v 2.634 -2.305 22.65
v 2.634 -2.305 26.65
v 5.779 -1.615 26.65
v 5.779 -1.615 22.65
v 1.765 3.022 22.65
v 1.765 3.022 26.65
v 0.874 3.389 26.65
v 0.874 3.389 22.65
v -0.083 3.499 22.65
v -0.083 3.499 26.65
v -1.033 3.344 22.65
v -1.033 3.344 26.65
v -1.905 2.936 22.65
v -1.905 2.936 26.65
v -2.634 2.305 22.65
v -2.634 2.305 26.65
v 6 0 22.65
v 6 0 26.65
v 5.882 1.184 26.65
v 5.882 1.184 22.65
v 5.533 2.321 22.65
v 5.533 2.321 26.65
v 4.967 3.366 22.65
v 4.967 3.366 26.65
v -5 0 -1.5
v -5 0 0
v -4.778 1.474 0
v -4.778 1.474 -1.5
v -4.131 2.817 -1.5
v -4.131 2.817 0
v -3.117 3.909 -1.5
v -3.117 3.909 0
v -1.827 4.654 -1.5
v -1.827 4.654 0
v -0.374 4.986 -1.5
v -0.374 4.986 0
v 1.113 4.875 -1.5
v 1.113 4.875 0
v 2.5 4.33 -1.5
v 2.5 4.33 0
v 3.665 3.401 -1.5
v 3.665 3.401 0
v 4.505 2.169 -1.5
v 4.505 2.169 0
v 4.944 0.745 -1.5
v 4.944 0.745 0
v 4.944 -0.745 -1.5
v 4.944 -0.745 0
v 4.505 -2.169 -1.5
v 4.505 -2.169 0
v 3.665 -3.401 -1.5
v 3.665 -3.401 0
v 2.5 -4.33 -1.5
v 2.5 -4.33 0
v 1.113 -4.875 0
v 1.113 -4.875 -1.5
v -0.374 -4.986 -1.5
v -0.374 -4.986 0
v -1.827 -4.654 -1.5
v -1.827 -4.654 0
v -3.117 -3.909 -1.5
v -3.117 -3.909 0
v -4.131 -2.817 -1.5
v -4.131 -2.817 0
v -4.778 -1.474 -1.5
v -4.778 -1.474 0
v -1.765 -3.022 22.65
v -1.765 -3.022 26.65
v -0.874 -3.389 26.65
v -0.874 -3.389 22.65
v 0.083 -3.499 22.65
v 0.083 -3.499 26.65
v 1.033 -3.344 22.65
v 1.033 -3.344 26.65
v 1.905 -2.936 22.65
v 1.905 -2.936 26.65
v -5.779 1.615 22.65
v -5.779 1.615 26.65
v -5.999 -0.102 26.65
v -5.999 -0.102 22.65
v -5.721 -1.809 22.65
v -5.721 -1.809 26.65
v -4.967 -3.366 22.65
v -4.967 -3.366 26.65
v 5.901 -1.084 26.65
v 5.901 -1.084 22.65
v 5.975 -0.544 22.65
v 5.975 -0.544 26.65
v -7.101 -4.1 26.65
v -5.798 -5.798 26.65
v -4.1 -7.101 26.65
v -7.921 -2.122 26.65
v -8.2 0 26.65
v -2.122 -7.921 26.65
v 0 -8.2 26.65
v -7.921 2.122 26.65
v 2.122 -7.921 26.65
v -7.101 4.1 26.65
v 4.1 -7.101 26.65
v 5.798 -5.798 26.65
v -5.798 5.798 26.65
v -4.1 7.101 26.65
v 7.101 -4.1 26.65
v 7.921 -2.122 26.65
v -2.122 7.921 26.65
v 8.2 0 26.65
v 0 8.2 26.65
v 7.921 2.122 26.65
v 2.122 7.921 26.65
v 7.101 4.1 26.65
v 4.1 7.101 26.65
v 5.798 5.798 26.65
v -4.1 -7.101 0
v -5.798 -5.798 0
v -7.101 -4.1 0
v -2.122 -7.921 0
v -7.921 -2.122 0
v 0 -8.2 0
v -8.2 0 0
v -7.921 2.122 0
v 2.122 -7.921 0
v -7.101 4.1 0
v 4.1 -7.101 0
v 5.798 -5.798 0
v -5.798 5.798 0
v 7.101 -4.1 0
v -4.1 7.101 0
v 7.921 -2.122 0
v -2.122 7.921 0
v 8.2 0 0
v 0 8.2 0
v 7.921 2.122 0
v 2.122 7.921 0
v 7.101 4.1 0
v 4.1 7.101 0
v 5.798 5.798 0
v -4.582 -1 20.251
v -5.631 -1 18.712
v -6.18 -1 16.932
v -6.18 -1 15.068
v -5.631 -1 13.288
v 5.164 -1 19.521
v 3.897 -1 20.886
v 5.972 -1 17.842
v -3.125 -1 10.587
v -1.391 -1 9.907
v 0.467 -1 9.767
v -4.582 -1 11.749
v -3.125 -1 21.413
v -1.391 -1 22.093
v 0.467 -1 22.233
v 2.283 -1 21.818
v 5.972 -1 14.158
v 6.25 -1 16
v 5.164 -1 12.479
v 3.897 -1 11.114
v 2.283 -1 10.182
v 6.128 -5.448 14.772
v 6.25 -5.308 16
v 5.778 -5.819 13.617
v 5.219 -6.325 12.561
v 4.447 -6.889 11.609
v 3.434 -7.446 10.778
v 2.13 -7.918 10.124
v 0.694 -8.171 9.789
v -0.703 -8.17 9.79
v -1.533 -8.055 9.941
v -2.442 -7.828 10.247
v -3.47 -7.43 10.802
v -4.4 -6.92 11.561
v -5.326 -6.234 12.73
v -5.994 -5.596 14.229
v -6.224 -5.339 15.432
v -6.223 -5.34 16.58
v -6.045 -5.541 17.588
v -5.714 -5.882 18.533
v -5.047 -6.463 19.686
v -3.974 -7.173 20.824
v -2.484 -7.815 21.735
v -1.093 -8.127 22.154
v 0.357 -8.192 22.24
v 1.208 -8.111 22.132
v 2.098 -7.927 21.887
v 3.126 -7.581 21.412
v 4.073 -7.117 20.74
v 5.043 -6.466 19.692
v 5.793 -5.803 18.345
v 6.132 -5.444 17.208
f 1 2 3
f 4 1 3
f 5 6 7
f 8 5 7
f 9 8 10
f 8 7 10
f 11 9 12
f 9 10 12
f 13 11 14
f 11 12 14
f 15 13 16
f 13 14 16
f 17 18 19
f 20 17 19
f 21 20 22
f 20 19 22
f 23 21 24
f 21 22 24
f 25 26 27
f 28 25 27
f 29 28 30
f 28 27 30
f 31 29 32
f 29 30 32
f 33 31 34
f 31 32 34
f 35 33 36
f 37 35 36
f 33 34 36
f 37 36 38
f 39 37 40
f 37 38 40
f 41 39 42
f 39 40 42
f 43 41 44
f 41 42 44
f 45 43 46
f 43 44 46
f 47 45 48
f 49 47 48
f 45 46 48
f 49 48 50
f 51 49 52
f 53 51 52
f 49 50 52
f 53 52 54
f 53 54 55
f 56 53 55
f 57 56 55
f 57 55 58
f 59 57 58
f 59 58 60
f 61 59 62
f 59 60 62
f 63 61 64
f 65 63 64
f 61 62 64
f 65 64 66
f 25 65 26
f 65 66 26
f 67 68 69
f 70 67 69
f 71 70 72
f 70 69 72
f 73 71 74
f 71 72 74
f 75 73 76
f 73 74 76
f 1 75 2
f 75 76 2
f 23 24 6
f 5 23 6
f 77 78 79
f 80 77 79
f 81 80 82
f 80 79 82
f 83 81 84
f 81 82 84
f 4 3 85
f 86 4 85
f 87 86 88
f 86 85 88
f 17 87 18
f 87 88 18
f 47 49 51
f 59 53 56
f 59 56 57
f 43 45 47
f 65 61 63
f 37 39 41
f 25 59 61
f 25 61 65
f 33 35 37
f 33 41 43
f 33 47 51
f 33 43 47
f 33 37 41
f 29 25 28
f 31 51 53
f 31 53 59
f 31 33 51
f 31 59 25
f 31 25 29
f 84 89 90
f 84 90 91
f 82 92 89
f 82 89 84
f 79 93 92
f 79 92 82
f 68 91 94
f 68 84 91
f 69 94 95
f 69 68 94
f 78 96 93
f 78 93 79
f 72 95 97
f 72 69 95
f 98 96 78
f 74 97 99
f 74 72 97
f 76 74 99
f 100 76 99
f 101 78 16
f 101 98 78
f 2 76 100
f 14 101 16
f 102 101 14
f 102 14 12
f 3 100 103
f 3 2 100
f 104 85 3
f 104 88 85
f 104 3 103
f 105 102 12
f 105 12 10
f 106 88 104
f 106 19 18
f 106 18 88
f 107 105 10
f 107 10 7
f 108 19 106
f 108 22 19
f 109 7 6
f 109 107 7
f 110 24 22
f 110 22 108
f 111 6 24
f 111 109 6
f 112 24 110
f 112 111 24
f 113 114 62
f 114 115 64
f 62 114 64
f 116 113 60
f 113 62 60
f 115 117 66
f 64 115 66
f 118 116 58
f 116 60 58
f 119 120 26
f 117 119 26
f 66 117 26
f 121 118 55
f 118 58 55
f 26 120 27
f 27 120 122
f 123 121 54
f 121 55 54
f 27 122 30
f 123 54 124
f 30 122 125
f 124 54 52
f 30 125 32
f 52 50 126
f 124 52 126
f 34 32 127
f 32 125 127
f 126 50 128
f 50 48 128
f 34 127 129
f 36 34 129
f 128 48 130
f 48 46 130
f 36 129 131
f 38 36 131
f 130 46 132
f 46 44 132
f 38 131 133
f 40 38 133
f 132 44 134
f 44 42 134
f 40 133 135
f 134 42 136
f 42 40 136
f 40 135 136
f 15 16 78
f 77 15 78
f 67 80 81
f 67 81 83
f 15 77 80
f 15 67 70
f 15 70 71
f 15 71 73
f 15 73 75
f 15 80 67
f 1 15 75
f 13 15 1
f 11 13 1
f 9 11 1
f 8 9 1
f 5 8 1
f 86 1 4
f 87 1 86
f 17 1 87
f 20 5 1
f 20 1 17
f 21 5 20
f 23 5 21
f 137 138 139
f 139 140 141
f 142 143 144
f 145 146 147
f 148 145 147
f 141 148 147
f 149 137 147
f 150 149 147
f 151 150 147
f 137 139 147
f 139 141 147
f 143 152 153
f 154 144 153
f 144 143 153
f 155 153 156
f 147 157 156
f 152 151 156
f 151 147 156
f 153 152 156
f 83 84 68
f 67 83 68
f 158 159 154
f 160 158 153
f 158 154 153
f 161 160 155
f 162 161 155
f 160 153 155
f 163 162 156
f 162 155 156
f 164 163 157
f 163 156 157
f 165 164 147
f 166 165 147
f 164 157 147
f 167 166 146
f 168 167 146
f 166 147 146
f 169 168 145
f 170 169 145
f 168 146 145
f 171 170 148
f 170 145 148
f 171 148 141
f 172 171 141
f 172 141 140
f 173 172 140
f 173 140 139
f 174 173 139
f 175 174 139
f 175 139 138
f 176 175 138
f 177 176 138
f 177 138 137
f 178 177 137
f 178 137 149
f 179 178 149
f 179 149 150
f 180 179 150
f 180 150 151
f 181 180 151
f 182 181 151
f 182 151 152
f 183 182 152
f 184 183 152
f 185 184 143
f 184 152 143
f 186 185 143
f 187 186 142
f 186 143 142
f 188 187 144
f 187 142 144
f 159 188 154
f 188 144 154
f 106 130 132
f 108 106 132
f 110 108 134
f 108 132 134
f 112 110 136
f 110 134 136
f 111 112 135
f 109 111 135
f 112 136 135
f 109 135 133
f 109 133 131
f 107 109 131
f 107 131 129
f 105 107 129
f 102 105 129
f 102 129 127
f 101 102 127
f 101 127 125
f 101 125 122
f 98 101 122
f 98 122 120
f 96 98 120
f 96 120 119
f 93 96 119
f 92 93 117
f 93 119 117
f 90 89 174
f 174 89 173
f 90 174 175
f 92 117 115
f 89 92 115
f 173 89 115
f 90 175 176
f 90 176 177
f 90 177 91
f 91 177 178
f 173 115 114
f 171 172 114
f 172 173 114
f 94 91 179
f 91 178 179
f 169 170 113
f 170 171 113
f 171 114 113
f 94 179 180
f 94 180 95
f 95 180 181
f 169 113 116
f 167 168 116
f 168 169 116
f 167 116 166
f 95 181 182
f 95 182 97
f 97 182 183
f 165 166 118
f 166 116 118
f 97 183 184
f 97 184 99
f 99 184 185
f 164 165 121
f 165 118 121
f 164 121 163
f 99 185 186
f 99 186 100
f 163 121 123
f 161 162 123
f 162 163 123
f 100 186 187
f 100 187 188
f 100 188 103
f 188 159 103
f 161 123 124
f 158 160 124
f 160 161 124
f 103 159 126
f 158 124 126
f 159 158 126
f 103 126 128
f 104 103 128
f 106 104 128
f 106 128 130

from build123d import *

# Parameters (mm, degrees)
SKETCH_1_R          = 8.2
EXTRUDE_1_DEPTH     = 26.65
SKETCH_3_R          = 5
EXTRUDE_2_DEPTH     = 1.5
CUT_EXTRUDE_1_DEPTH = 4
CUT_EXTRUDE_START   = -1
SKETCH_5_R          = 6.25
CUT_EXTRUDE_2_DEPTH = 10


with BuildPart() as part:
    # Эскиз1 → Бобышка-Вытянуть1 (new body)
    with BuildSketch(Plane.XY):
        Circle(SKETCH_1_R)
    extrude(amount=EXTRUDE_1_DEPTH)

    # Эскиз3 → Бобышка-Вытянуть2 (add)
    with BuildSketch(Plane(origin=(0, 0, 0), x_dir=(-1, 0, 0), z_dir=(0, 0, -1))):
        Circle(SKETCH_3_R)
    extrude(amount=EXTRUDE_2_DEPTH)

    # Эскиз4 → Вырез-Вытянуть1 (cut)
    with BuildSketch(Plane.XY.offset(26.65)):
        with BuildLine():
            ThreePointArc((1.764967336, 3.022398105), (-0.563166375, 3.454394829), (-2.63353871, 2.305314265))
            Line((-2.63353871, 2.305314265), (-5.778686809, 1.614552185))
            ThreePointArc((-5.778686809, 1.614552185), (-5.921819707, -0.965428072), (-4.966654884, -3.366354001))
            Line((-4.966654884, -3.366354001), (-1.764967336, -3.022398105))
            ThreePointArc((-1.764967336, -3.022398105), (0.563166375, -3.454394829), (2.63353871, -2.305314265))
            Line((2.63353871, -2.305314265), (5.778686809, -1.614552185))
            ThreePointArc((5.778686809, -1.614552185), (5.944414221, -0.814824872), (6, 0))
            ThreePointArc((6, 0), (5.735849079, 1.760691724), (4.966654884, 3.366354001))
            Line((4.966654884, 3.366354001), (1.764967336, 3.022398105))
        make_face()
    extrude(amount=-CUT_EXTRUDE_1_DEPTH, mode=Mode.SUBTRACT)

    # Эскиз5 → Вырез-Вытянуть2 (cut)
    with BuildSketch(Plane(origin=(0, 0, 0), x_dir=(1, 0, 0), z_dir=(0, 1, 0)).offset(CUT_EXTRUDE_START)):
        with Locations((0, -16)):
            Circle(SKETCH_5_R)
    extrude(amount=-CUT_EXTRUDE_2_DEPTH, mode=Mode.SUBTRACT)


solid = part.part
